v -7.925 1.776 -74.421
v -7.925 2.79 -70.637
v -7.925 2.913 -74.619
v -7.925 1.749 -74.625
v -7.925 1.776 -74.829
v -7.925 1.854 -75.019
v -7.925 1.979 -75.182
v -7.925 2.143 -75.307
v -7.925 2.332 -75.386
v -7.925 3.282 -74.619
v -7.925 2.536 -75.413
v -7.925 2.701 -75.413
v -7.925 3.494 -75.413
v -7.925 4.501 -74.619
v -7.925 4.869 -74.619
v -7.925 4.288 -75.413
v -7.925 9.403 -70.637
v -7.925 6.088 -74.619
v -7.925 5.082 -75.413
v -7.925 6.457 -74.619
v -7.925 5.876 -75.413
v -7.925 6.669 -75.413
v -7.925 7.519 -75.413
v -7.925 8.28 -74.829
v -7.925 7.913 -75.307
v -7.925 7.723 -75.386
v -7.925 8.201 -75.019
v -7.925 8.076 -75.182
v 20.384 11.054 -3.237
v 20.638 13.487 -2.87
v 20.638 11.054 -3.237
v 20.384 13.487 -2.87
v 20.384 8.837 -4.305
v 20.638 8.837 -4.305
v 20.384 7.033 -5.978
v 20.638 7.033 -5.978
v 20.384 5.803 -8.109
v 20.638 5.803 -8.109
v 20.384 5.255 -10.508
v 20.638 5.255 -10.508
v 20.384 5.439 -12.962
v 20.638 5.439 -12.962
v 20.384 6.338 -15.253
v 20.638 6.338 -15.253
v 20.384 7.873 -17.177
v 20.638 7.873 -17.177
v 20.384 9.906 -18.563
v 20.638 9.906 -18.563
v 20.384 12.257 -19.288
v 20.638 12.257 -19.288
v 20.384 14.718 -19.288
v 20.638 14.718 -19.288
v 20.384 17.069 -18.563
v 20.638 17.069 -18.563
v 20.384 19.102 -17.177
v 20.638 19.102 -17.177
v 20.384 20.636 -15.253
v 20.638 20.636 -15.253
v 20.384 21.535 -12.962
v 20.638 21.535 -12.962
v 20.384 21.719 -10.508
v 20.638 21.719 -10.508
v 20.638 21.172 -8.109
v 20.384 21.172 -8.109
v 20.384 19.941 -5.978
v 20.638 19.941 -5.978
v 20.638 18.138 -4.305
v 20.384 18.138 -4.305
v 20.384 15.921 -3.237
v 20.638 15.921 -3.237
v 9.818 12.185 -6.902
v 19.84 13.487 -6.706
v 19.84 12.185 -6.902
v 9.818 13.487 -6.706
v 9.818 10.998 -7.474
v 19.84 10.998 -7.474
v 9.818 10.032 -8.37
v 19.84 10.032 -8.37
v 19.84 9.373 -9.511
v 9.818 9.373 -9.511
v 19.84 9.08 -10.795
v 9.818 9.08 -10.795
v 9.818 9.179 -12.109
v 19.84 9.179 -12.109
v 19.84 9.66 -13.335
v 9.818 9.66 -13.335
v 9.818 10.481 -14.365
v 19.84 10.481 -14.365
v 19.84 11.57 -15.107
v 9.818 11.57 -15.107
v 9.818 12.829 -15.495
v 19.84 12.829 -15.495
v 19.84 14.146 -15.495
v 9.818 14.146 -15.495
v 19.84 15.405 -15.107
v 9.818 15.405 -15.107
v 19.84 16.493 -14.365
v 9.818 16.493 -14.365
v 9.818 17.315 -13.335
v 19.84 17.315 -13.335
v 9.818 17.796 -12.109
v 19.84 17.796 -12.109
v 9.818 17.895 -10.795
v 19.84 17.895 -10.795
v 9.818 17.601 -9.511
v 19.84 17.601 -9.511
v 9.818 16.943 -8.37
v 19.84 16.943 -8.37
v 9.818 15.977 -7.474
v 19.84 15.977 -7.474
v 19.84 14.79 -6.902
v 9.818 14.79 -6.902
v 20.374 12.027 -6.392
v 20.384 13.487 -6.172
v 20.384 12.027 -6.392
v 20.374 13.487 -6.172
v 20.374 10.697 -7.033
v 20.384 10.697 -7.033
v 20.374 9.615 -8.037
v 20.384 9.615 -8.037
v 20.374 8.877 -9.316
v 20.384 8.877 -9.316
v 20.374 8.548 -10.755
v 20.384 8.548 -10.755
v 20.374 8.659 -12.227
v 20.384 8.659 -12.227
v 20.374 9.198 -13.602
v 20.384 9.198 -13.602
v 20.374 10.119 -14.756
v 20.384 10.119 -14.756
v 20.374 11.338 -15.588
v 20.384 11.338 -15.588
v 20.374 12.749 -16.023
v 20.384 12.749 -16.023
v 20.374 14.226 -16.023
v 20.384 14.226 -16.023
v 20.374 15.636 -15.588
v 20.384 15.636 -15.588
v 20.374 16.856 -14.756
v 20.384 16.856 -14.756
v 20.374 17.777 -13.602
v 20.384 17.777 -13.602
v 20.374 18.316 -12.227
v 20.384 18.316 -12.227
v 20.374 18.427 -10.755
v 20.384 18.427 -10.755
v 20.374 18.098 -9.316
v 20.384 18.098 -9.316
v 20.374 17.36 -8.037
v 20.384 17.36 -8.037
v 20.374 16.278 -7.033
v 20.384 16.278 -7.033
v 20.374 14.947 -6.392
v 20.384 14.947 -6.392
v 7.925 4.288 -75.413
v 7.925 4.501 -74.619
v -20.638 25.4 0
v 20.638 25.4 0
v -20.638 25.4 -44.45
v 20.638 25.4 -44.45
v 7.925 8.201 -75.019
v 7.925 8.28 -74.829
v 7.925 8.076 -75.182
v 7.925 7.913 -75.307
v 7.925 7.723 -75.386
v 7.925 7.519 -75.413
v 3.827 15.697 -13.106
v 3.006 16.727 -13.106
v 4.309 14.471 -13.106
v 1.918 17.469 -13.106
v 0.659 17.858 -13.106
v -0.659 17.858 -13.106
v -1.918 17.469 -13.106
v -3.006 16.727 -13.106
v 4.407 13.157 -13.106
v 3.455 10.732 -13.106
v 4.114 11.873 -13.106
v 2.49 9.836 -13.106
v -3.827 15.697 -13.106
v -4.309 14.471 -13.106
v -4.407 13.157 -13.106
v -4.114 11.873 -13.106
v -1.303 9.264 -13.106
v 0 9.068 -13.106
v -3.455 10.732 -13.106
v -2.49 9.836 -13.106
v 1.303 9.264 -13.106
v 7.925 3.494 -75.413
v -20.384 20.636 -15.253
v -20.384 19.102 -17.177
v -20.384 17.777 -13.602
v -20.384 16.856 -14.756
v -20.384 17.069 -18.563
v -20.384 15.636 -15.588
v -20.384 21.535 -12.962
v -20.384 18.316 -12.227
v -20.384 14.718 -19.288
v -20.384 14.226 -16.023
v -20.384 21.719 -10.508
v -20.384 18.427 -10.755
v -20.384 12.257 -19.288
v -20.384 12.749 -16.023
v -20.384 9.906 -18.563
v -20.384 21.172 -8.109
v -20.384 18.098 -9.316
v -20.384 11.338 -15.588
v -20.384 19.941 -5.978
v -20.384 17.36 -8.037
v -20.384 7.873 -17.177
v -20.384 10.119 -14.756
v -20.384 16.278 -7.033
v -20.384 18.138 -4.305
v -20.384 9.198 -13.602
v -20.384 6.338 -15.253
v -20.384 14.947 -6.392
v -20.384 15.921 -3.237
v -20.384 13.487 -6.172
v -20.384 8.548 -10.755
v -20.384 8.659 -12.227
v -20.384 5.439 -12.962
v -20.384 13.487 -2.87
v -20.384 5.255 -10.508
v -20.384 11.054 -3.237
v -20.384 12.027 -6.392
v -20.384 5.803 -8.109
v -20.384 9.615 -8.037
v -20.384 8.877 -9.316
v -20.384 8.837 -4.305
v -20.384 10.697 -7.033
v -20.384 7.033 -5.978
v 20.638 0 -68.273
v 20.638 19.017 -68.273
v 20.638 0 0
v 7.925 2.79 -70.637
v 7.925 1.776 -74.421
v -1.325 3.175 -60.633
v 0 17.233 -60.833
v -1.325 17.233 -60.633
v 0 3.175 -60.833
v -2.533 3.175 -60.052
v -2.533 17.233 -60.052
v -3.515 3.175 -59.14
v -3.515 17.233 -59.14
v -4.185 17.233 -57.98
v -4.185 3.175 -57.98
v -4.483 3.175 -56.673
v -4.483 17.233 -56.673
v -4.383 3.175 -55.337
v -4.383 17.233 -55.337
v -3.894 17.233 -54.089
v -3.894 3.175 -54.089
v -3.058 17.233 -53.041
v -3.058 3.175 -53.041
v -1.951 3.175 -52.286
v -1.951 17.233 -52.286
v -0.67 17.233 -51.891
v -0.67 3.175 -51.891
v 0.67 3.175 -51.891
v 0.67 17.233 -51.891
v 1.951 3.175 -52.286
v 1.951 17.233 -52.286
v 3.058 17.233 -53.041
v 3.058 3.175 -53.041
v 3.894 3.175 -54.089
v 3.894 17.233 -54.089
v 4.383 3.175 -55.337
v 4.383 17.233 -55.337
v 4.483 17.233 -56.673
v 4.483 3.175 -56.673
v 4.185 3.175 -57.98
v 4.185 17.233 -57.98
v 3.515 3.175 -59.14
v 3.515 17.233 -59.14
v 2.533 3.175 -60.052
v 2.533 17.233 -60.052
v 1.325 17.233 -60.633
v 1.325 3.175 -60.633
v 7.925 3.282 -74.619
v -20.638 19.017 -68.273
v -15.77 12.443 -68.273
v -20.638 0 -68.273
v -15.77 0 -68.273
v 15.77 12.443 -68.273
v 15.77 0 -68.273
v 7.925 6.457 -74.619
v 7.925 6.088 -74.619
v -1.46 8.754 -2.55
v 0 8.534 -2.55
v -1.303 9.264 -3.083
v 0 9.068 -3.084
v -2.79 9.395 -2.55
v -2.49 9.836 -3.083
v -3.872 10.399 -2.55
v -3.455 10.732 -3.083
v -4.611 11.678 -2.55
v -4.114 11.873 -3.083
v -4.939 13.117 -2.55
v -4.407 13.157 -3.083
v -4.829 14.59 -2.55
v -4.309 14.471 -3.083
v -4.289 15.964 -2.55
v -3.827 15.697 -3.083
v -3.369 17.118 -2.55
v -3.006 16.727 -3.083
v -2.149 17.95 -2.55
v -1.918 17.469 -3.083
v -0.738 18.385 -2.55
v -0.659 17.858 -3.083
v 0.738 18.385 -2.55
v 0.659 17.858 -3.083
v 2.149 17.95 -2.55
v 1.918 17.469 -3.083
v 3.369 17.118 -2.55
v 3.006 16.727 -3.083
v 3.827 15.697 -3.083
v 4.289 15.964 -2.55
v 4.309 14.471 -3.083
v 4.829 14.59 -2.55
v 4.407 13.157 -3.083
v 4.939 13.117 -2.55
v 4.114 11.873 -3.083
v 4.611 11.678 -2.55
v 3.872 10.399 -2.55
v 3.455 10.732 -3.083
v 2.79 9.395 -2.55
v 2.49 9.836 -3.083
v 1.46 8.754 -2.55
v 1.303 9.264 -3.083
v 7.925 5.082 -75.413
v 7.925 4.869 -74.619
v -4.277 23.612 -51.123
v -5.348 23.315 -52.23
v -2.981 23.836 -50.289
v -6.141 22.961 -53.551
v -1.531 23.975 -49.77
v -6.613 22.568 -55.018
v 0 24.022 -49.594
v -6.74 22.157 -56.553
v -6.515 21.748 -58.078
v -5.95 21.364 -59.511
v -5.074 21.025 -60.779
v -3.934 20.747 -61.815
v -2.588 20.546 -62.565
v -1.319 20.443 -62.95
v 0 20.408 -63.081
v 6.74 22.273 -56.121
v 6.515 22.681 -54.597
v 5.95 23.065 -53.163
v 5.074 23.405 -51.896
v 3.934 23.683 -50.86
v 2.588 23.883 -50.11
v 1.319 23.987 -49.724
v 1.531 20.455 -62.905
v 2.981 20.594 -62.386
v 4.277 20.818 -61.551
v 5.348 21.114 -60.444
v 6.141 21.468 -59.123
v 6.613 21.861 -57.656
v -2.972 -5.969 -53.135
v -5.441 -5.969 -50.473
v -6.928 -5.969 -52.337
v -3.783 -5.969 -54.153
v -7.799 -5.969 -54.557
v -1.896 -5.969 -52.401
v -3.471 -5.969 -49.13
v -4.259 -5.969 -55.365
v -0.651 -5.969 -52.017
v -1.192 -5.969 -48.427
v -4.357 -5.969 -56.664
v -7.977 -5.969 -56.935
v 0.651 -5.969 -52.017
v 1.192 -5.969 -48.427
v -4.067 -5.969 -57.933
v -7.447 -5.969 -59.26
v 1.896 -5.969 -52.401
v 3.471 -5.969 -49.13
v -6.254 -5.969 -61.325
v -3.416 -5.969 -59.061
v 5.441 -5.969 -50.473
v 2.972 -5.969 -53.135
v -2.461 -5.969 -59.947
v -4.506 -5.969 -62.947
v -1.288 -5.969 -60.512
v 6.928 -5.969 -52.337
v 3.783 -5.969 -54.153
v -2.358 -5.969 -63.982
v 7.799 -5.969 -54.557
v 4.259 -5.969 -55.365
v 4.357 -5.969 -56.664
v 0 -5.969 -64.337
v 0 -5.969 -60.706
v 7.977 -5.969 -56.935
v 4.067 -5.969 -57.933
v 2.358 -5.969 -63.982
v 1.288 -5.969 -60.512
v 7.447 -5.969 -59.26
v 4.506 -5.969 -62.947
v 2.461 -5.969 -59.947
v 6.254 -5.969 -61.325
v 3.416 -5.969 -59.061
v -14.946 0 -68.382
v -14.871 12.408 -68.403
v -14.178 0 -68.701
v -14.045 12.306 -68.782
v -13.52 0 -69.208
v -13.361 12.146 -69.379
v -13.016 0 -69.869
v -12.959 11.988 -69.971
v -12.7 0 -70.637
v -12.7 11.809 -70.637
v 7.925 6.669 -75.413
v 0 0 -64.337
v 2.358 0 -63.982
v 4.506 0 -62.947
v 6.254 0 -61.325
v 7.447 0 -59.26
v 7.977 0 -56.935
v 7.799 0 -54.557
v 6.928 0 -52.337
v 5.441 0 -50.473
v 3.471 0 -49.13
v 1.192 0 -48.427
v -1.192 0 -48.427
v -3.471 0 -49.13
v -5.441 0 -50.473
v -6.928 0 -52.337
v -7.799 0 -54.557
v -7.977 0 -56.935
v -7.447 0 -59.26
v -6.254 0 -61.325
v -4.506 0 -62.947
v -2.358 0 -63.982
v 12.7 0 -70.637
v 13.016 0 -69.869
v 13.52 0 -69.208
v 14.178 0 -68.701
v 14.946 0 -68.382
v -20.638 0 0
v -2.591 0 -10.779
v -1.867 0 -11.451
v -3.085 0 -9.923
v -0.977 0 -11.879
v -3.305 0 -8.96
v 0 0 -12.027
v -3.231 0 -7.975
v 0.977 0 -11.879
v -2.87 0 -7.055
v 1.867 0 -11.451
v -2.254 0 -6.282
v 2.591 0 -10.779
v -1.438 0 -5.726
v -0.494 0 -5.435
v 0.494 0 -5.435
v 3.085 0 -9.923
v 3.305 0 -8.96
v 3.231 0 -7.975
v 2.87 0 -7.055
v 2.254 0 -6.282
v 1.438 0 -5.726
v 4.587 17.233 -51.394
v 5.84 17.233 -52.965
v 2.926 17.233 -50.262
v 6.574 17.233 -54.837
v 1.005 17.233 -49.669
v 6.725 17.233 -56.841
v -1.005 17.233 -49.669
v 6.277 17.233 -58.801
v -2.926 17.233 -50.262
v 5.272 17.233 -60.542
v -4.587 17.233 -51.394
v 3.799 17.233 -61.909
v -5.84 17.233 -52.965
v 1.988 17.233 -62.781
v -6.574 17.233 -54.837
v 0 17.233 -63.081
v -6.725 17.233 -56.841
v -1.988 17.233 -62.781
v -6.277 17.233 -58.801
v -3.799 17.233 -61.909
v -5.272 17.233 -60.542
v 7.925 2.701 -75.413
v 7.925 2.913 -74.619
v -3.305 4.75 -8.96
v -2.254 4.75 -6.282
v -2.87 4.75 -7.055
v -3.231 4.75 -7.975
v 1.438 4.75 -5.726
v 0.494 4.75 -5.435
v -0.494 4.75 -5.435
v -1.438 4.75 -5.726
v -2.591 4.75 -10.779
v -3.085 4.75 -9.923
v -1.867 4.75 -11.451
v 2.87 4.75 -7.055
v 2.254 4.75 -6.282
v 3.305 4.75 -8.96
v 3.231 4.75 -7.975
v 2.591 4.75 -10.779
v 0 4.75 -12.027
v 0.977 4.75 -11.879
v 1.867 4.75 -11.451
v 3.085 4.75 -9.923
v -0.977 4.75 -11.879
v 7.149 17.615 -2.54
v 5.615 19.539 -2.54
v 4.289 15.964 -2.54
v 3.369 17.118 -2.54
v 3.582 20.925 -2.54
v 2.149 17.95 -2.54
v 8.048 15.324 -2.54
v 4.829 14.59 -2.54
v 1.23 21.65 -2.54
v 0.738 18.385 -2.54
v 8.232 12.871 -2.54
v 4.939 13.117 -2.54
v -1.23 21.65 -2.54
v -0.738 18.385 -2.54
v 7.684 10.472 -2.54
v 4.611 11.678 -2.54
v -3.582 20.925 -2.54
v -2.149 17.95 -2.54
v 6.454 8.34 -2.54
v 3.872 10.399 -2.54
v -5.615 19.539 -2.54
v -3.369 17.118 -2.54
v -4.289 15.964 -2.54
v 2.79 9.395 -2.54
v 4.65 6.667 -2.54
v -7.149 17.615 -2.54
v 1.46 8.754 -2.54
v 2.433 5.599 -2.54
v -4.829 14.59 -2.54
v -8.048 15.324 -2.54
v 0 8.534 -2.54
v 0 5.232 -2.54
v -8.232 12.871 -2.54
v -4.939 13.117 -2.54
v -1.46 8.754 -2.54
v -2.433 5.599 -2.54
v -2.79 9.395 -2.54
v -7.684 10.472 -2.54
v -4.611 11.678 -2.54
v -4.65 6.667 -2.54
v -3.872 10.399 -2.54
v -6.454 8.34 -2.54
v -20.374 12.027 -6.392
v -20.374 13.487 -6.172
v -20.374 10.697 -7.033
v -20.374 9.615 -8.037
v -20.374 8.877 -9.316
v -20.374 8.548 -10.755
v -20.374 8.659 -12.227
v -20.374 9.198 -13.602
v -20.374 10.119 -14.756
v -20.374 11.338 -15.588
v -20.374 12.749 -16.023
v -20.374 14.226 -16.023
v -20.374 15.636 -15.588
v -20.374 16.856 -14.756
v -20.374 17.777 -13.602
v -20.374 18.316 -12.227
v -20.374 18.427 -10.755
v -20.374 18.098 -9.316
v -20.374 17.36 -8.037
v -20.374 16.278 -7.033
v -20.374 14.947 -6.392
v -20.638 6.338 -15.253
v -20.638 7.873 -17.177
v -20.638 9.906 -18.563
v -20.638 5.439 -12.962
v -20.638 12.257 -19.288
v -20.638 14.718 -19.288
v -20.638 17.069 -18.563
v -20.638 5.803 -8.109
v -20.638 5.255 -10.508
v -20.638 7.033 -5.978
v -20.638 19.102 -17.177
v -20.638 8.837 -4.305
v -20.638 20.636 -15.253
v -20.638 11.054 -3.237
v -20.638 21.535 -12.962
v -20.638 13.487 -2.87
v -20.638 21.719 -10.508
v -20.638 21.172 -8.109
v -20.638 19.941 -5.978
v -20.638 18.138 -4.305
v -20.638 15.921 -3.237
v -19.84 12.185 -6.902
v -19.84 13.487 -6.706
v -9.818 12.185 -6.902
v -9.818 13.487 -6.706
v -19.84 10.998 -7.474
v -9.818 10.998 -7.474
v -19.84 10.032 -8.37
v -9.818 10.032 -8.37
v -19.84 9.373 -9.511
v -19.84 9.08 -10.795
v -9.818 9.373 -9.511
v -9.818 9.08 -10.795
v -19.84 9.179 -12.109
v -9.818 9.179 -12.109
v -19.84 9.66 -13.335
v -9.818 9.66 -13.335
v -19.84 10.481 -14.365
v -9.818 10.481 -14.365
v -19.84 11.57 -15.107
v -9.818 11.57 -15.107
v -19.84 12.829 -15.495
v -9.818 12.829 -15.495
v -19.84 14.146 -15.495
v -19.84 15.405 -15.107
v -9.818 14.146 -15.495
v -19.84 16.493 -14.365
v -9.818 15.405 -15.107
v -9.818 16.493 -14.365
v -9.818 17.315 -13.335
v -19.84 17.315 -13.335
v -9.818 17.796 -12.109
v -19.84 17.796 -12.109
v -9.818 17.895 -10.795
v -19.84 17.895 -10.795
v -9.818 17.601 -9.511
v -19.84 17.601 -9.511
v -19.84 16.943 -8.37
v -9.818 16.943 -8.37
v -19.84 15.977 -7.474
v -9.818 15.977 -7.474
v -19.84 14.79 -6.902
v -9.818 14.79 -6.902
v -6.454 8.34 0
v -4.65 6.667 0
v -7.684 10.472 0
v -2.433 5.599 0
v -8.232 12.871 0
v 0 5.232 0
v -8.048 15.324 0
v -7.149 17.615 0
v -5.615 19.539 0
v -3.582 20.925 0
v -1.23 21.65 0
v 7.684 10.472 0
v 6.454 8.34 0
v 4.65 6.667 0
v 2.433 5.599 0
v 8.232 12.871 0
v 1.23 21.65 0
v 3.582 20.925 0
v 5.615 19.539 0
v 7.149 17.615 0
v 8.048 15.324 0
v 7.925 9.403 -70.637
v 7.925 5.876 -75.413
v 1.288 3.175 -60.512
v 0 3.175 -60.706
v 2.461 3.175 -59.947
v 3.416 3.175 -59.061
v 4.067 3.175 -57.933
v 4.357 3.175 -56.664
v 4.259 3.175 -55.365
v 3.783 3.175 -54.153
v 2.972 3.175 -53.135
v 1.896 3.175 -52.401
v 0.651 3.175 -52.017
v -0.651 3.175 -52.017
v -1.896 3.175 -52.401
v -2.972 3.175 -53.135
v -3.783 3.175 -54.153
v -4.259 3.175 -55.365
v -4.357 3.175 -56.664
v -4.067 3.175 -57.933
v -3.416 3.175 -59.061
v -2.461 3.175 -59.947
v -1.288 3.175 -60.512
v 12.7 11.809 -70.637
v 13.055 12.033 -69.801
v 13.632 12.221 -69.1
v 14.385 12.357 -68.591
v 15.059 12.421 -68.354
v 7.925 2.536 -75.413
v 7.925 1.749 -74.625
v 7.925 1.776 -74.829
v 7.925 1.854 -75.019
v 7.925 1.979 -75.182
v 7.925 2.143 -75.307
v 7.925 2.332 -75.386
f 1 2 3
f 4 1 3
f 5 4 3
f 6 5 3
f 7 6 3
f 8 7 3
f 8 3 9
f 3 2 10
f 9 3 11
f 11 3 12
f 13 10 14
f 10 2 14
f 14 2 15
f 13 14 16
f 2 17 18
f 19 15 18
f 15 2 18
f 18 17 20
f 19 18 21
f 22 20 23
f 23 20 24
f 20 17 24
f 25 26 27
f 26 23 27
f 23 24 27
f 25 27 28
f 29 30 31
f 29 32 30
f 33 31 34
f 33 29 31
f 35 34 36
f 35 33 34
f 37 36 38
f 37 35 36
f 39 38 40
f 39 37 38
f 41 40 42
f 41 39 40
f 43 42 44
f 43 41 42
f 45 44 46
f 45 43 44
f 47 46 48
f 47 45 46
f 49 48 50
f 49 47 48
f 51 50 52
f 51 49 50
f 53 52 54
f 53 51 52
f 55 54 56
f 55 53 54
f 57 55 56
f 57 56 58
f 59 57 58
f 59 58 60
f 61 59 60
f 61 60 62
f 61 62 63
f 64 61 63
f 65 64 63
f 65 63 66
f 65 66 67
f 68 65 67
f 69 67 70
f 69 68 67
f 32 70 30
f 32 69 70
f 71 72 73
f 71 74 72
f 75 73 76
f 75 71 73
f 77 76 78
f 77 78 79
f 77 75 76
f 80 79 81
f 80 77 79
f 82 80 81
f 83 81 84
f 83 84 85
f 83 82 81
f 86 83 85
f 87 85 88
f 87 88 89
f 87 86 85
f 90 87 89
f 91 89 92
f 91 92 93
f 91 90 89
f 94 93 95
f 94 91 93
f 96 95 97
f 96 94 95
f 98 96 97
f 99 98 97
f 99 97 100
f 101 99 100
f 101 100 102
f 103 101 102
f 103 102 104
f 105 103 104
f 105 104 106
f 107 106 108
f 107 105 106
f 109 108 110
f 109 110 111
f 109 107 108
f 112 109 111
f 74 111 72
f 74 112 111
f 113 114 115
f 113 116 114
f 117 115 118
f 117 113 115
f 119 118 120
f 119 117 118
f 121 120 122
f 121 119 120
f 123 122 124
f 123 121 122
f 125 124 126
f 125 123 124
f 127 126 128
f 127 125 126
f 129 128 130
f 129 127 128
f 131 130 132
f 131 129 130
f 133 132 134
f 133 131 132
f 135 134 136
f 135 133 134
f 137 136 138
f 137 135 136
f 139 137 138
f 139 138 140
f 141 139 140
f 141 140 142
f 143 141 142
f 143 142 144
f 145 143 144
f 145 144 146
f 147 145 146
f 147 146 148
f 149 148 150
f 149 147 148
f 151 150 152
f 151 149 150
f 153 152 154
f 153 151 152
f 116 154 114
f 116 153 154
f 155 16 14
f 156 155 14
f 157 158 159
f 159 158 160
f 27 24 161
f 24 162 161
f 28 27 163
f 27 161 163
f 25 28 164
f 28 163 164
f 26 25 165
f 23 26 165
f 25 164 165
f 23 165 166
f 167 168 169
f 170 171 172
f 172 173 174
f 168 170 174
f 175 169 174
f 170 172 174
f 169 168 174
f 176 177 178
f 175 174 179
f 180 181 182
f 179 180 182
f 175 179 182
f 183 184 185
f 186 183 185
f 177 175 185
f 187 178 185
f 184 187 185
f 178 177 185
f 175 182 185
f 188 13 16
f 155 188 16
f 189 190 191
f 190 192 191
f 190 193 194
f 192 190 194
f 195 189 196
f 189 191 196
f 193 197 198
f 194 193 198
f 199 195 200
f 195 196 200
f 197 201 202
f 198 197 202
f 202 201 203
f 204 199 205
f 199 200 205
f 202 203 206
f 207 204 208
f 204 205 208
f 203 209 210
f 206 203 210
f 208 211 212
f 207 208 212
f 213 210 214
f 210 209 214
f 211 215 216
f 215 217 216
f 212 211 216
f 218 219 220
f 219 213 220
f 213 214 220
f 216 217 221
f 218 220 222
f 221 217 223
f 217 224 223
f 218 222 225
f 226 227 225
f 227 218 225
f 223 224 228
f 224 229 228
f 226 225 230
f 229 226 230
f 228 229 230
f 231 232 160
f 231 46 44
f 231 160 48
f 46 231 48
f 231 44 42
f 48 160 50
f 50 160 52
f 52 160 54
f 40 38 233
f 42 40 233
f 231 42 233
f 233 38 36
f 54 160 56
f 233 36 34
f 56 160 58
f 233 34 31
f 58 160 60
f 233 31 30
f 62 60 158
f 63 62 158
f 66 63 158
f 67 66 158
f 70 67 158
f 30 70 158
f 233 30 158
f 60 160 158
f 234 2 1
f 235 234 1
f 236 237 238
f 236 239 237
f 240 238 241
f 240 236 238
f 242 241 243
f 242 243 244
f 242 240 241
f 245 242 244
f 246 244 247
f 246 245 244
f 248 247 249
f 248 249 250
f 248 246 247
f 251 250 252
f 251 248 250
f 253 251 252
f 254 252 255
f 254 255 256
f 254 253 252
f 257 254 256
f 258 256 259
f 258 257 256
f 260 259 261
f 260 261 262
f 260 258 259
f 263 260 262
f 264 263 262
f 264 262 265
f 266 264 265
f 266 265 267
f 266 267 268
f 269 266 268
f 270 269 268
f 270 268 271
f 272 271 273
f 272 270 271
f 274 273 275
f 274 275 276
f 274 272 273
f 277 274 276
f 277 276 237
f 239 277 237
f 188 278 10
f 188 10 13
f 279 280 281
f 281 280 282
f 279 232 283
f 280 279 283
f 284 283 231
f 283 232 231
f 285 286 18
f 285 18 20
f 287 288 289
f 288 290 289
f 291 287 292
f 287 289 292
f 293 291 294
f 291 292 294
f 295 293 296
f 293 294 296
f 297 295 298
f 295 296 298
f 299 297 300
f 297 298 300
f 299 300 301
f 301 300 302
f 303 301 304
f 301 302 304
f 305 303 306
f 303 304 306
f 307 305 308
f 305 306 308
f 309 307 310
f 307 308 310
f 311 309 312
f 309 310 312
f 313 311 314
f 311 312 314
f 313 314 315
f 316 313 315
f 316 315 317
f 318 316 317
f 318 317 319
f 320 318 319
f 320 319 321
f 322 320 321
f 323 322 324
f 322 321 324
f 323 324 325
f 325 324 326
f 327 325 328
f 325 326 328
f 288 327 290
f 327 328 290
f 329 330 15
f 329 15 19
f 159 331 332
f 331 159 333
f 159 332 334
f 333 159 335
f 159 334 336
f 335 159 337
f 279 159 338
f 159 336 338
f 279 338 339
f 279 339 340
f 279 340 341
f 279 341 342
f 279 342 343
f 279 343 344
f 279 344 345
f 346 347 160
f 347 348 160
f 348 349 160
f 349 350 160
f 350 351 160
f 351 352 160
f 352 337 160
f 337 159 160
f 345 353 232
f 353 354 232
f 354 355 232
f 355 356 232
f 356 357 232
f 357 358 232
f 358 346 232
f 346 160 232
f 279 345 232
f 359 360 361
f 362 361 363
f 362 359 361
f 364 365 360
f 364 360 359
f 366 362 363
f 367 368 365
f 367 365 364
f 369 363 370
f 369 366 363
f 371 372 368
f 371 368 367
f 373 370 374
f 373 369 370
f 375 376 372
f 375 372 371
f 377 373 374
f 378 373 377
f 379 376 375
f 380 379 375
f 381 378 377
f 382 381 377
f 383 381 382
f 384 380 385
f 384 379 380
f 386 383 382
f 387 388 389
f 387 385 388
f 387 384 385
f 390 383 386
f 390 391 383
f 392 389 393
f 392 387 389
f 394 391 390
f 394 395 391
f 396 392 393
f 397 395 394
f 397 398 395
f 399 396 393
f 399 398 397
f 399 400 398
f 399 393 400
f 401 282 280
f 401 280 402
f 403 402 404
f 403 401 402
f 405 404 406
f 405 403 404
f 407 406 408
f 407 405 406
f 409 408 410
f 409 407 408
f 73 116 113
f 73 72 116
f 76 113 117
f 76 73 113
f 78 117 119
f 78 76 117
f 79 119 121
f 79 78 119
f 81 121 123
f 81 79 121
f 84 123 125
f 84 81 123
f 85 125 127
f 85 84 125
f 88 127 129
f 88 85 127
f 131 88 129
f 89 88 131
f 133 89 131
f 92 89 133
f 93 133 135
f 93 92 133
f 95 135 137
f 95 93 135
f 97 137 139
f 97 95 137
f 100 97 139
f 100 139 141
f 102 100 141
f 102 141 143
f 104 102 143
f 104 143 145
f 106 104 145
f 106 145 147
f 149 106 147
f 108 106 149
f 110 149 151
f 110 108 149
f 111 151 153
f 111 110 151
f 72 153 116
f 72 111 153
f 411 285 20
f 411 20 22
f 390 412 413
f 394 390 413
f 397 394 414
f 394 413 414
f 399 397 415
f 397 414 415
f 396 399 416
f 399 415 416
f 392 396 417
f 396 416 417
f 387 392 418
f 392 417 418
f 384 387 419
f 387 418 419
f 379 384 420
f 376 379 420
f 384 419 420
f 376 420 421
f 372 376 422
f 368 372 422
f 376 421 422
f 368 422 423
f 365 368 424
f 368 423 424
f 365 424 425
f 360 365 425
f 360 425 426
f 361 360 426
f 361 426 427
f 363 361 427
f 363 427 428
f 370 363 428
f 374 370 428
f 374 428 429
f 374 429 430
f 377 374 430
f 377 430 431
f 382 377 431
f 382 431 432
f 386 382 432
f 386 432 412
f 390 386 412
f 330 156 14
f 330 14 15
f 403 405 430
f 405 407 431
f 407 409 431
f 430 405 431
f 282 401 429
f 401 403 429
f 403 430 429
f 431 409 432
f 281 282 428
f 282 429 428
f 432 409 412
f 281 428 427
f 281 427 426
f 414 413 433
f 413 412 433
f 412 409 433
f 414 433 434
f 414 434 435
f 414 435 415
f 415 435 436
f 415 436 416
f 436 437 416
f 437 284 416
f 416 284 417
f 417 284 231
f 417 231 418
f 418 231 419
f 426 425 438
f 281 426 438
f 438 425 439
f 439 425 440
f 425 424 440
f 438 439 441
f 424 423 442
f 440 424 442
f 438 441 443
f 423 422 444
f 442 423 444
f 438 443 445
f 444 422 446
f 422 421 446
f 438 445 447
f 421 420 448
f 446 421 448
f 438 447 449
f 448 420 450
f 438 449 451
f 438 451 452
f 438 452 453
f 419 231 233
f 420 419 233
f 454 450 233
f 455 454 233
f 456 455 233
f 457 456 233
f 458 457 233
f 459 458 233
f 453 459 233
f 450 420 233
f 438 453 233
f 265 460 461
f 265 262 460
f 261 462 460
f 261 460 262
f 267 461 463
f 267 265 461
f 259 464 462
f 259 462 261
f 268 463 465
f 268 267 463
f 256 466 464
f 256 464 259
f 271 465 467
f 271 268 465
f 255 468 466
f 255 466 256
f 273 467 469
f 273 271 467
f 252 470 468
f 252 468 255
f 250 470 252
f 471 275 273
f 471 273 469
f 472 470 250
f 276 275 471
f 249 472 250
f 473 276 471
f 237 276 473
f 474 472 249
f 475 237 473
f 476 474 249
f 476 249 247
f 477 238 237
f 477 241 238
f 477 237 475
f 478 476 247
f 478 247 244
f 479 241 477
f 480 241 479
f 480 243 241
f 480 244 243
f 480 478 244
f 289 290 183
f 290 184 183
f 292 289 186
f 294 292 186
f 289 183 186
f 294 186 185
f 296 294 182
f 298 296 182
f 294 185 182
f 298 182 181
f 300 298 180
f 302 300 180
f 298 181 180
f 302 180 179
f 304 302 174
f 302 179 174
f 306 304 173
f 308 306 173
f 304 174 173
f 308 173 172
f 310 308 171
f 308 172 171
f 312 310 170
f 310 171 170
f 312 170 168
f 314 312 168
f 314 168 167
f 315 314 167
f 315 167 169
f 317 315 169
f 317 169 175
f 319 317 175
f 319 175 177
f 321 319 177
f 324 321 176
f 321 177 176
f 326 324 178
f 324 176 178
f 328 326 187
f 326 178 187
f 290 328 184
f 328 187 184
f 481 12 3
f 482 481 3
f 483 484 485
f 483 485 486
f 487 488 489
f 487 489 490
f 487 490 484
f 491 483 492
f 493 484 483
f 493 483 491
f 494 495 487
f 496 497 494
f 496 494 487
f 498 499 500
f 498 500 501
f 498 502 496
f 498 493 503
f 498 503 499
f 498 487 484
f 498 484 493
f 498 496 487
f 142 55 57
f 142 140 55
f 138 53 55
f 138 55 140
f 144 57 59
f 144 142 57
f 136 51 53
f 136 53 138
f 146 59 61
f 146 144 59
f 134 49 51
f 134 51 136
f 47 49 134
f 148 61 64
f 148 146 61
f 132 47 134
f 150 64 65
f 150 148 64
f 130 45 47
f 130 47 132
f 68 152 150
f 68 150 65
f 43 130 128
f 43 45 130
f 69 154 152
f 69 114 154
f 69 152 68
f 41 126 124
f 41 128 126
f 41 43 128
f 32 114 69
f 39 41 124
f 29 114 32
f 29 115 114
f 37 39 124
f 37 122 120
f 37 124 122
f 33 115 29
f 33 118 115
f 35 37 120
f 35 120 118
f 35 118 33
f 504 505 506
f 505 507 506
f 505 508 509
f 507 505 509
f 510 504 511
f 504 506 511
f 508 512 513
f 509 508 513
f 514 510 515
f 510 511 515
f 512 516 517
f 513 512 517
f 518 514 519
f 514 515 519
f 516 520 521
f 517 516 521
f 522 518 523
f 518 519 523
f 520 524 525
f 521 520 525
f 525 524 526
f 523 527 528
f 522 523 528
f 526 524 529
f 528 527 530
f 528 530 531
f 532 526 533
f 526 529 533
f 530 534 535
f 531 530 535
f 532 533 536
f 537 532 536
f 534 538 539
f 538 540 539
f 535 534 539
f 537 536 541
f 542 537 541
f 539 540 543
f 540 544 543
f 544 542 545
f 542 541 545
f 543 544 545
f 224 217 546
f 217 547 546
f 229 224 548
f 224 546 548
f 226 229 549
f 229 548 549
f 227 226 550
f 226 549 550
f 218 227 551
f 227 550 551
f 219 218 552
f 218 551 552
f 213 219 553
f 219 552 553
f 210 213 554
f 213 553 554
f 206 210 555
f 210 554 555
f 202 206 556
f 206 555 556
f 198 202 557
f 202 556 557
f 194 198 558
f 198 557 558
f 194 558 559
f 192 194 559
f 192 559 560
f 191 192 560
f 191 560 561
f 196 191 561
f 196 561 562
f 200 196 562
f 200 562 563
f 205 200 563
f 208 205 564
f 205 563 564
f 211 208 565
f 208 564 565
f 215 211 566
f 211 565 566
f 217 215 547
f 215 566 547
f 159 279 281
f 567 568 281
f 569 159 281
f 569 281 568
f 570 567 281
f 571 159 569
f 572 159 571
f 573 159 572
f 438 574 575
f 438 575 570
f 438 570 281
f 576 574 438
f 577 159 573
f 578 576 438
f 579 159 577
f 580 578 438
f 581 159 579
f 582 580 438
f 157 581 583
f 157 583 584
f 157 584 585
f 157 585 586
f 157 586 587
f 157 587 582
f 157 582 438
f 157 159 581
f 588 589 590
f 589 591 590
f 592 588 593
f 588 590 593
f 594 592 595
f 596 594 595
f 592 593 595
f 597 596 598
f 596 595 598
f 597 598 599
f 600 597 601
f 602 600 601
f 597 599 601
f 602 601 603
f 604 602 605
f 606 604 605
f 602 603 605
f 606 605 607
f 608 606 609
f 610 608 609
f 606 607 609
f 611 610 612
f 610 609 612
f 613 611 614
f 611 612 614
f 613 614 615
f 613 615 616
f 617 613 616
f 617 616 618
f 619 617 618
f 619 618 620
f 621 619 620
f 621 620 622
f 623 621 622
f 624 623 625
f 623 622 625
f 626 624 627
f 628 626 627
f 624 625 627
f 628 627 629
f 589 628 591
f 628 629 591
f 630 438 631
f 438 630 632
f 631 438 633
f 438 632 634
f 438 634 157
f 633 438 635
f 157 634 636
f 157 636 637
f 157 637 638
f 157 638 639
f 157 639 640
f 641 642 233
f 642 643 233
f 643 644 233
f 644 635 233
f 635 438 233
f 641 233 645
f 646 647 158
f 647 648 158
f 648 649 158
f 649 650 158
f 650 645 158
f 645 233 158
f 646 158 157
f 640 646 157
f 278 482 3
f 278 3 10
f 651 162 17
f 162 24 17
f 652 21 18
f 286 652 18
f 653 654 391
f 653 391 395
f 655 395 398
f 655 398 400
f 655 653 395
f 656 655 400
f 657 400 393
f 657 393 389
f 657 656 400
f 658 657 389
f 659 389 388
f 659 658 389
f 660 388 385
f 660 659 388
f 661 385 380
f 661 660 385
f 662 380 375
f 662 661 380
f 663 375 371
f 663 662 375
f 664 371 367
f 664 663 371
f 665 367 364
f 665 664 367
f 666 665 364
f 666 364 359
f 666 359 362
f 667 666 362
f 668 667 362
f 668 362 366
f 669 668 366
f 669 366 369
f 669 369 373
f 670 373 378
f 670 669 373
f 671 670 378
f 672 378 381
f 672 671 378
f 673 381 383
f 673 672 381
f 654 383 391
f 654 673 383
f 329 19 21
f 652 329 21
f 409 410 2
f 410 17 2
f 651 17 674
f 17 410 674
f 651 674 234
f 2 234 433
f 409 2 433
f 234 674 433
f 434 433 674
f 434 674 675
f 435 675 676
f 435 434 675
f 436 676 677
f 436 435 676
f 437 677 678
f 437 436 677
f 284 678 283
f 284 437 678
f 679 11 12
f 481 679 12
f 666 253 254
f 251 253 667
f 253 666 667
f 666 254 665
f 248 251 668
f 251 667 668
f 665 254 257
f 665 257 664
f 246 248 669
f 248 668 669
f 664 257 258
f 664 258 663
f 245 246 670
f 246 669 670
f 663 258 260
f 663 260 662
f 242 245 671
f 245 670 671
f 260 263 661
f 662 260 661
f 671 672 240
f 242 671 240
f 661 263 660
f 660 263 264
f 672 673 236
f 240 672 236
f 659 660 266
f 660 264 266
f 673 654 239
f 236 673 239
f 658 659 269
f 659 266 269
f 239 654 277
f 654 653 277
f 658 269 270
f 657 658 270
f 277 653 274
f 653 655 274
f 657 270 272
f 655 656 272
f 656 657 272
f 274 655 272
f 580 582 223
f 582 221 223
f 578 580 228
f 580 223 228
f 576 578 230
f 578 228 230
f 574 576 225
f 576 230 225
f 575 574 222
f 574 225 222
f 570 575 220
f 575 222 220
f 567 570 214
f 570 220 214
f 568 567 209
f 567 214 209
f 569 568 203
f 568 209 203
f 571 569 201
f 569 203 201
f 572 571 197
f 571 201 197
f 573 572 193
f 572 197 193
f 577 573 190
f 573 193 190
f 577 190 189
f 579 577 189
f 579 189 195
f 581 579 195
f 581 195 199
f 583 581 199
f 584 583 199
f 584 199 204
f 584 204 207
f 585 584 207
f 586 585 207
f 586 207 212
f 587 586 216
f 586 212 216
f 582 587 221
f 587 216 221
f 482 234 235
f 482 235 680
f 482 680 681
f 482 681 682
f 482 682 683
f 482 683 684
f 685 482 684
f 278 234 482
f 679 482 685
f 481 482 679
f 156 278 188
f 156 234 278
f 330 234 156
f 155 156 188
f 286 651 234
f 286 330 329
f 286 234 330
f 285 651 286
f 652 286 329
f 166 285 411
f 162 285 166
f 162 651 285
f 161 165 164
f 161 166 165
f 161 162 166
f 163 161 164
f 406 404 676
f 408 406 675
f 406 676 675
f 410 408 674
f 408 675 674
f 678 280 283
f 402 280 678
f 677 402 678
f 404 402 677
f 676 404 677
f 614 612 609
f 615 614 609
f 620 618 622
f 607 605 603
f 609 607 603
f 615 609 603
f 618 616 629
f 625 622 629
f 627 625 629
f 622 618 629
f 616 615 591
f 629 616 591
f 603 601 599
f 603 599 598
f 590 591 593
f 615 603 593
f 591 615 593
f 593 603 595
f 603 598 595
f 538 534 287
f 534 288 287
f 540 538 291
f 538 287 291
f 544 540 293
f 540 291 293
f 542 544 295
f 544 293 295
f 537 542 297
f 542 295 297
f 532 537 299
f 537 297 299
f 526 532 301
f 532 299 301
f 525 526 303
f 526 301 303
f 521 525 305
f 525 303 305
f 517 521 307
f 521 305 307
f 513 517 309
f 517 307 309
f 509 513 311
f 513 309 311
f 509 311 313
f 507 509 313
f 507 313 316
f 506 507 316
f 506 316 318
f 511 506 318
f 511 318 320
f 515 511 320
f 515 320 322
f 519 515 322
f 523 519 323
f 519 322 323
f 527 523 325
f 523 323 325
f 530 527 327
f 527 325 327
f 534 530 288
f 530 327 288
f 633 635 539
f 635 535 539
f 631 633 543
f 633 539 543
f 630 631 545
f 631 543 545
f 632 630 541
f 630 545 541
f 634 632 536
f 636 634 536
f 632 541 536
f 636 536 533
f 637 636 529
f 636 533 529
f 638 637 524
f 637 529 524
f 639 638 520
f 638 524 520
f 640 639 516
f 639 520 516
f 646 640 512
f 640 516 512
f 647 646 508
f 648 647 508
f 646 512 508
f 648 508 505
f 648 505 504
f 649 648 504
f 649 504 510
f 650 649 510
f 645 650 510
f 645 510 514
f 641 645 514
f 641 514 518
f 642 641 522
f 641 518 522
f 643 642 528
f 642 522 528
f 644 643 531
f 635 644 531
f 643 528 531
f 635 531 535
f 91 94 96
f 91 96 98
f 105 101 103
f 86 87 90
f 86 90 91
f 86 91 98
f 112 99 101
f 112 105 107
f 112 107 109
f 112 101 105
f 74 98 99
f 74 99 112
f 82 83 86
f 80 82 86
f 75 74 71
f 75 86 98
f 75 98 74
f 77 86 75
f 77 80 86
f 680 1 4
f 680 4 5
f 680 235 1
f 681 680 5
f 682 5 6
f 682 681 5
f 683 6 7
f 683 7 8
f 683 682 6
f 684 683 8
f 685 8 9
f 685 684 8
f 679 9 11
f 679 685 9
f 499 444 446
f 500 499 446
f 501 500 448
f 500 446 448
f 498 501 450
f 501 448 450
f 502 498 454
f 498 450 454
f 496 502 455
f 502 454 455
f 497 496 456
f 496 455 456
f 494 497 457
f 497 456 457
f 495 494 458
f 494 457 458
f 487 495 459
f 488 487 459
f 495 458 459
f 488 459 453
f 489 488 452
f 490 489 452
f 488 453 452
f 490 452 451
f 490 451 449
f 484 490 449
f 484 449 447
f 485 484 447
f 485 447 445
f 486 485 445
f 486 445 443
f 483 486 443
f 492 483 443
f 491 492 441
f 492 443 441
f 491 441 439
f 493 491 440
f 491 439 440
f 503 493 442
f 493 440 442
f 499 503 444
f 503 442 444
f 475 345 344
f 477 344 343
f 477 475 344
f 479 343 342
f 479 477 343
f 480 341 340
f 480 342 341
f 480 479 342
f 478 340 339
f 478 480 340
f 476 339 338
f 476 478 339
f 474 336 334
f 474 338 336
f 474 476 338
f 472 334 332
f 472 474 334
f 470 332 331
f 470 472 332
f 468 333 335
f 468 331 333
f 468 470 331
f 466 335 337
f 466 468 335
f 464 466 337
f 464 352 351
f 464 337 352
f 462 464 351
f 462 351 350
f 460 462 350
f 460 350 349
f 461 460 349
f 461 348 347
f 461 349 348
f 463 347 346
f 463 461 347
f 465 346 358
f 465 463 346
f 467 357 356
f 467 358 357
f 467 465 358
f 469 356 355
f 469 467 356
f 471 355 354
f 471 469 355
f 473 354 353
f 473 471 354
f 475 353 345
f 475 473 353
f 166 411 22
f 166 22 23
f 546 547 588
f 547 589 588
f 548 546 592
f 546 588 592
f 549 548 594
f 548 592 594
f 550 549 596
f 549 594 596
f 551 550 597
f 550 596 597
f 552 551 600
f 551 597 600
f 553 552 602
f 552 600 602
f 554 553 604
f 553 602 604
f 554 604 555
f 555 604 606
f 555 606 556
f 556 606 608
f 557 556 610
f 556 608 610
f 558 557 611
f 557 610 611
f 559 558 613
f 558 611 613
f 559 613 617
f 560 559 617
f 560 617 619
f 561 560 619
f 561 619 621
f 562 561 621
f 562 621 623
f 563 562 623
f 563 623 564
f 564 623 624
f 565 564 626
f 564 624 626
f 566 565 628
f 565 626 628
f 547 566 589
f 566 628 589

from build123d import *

# Parameters (mm, degrees)
EXTRUDE1_DEPTH      = 20.6375
EXTRUDE1_DEPTH_BACK = 20.6375
CUT_EXTRUDE1_REACH  = 27.4
SKETCH4_R           = 7.99973
SKETCH4_R_2         = 4.3688
EXTRUDE2_DEPTH      = 9.144
EXTRUDE3_DEPTH      = 7.925
EXTRUDE3_DEPTH_BACK = 7.925
CUT_EXTRUDE2_DEPTH  = 24.765
LPATTERN2_COUNT     = 3
LPATTERN2_PITCH     = 1.5875
FILLET1_R           = 0.7874
SKETCH11_R          = 3.3145
CUT_EXTRUDE3_DEPTH  = 4.7498


with BuildPart() as part:
    # Sketch1 → Extrude1 (new body, two sides)
    with BuildSketch(Plane(origin=(0, 0, 0), x_dir=(0, 0, -1), z_dir=(1, 0, 0))) as extrude1_sk:
        Polygon((44.45, 25.4), (68.273015024, 19.016642363), (68.273015024, 12.442638617), (70.6374, 11.809103573), (70.6374, 0), (0, 0), (0, 25.4), align=None)
    extrude(amount=EXTRUDE1_DEPTH)
    extrude(extrude1_sk.sketch, amount=-EXTRUDE1_DEPTH_BACK)

    # Cut-Extrude1: up to this plane
    cut_extrude1_end = Plane(origin=(-20.6375, 12.442638617, -68.273015024), z_dir=(0, 0.965925826, -0.258819045))
    # Sketch2 → Cut-Extrude1 (cut, up to the surface)
    with BuildSketch(Plane.XZ, mode=Mode.PRIVATE) as cut_extrude1_sk1:
        with BuildLine():
            Line((20.6375, -70.6374), (12.7, -70.6374))
            ThreePointArc((12.7, -70.6374), (13.832391453, -68.932629596), (15.769776585, -68.273015024))
            Line((15.769776585, -68.273015024), (20.6375, -68.273015024))
            Line((20.6375, -68.273015024), (20.6375, -70.6374))
        make_face()
    cut_extrude1_tool1 = split(extrude(cut_extrude1_sk1.sketch, amount=-CUT_EXTRUDE1_REACH, mode=Mode.PRIVATE), bisect_by=cut_extrude1_end, keep=Keep.BOTH, mode=Mode.PRIVATE)
    add(cut_extrude1_tool1.solids().sort_by_distance((17.033922, 0, -69.518139))[0], mode=Mode.SUBTRACT)
    # Sketch2 → Cut-Extrude1 (cut, up to the surface)
    with BuildSketch(Plane.XZ, mode=Mode.PRIVATE) as cut_extrude1_sk2:
        with BuildLine():
            Line((-20.6375, -68.273015024), (-15.769776585, -68.273015024))
            ThreePointArc((-15.769776585, -68.273015024), (-13.832391453, -68.932629596), (-12.7, -70.6374))
            Line((-12.7, -70.6374), (-20.6375, -70.6374))
            Line((-20.6375, -70.6374), (-20.6375, -68.273015024))
        make_face()
    cut_extrude1_tool2 = split(extrude(cut_extrude1_sk2.sketch, amount=-CUT_EXTRUDE1_REACH, mode=Mode.PRIVATE), bisect_by=cut_extrude1_end, keep=Keep.BOTH, mode=Mode.PRIVATE)
    add(cut_extrude1_tool2.solids().sort_by_distance((-17.033922, 0, -69.518139))[0], mode=Mode.SUBTRACT)

    # Sketch3 → Cut-Revolve1 (revolve, cut)
    with BuildSketch(Plane(origin=(0, 0, 0), x_dir=(0, 0, -1), z_dir=(1, 0, 0)), mode=Mode.PRIVATE) as cut_revolve1_sk:
        Polygon((49.5937, 24.021749739), (49.5937, 17.232918978), (51.8412, 17.232918978), (51.8412, 3.175), (48.3616, 3.175), (48.3616, 0), (56.3372, 0), (56.3372, 24.021749739), align=None)
    revolve(cut_revolve1_sk.sketch.rotate(Axis((0, -4.910727806, -56.3372), (0, 1, 0)), 180), axis=Axis((0, -4.910727806, -56.3372), (0, 1, 0)), mode=Mode.SUBTRACT)  # turned: the seam where the file's is

    # Sketch4 → Extrude2 (add)
    with BuildSketch(Plane.XZ.offset(-3.175)):
        with Locations(Location((0, -56.3372, 0), (0, 0, 270))):  # turned: the seam where the file's is
            Circle(SKETCH4_R)
        with Locations(Location((0, -56.3372, 0), (0, 0, 270))):  # turned: the seam where the file's is
            Circle(SKETCH4_R_2, mode=Mode.SUBTRACT)
    extrude(amount=EXTRUDE2_DEPTH)

    # Sketch6 → Extrude3 (add, two sides)
    with BuildSketch(Plane(origin=(0, 0, 0), x_dir=(0, 0, -1), z_dir=(1, 0, 0))) as extrude3_sk:
        Polygon((70.6374, 2.789570434), (75.4126, 1.51005945), (75.4126, 8.12340369), (70.6374, 9.402914674), align=None)
    extrude(amount=EXTRUDE3_DEPTH)
    extrude(extrude3_sk.sketch, amount=-EXTRUDE3_DEPTH_BACK)

    # Sketch7 → Cut-Extrude2 (cut, symmetric)
    with BuildSketch(Plane(origin=(0, 0, 0), x_dir=(0, 0, -1), z_dir=(1, 0, 0))):
        Polygon((75.4126, 3.49443445), (75.4126, 2.70068445), (74.61885, 2.913369121), (74.61885, 3.281749778), align=None)
    cut_extrude2 = extrude(amount=CUT_EXTRUDE2_DEPTH, both=True, mode=Mode.SUBTRACT)

    # LPattern2: Cut-Extrude2 ×3
    with Locations(*[(0, i * LPATTERN2_PITCH, 0) for i in range(1, LPATTERN2_COUNT)]):
        add(cut_extrude2, mode=Mode.SUBTRACT)

    # Fillet1
    fillet1_edges = [part.edges().sort_by_distance(p)[0] for p in [
        (0, 8.12340369, -75.4126),
        (0, 1.51005945, -75.4126),
    ]]
    fillet(fillet1_edges, radius=FILLET1_R)

    # Sketch11 → Cut-Extrude3 (cut)
    with BuildSketch(Plane.XZ):
        with Locations(Location((0, -8.7122, 0), (0, 0, 270))):  # turned: the seam where the file's is
            Circle(SKETCH11_R)
    extrude(amount=-CUT_EXTRUDE3_DEPTH, mode=Mode.SUBTRACT)

    # Sketch12 → Cut-Revolve2 (revolve, cut)
    with BuildSketch(Plane(origin=(0, 0, 0), x_dir=(0, 0, -1), z_dir=(1, 0, 0)), mode=Mode.PRIVATE) as cut_revolve2_sk:
        Polygon((0, 21.7424), (2.54, 21.7424), (2.54, 18.4404), (2.55, 18.4404), (3.0835, 17.9069), (13.106, 17.9069), (13.106, 13.4874), (0, 13.4874), align=None)
    revolve(cut_revolve2_sk.sketch.rotate(Axis((0, 13.4874, 3.668396013), (0, 0, -1)), 180), axis=Axis((0, 13.4874, 3.668396013), (0, 0, -1)), mode=Mode.SUBTRACT)  # turned: the seam where the file's is

    # Sketch13 → Cut-Revolve3 (revolve, cut)
    with BuildSketch(Plane.XY.offset(-11.1252), mode=Mode.PRIVATE) as cut_revolve3_sk:
        Polygon((20.6375, 21.7424), (20.3835, 21.7424), (20.3835, 18.4404), (20.3735, 18.4404), (19.84, 17.9069), (9.8175, 17.9069), (9.8175, 13.4874), (20.6375, 13.4874), align=None)
        Polygon((-20.6375, 13.4874), (-20.6375, 21.7424), (-20.3835, 21.7424), (-20.3835, 18.4404), (-20.3735, 18.4404), (-19.84, 17.9069), (-9.8175, 17.9069), (-9.8175, 13.4874), align=None)
    revolve(cut_revolve3_sk.sketch.rotate(Axis((0, 13.4874, -11.1252), (1, 0, 0)), 90), axis=Axis((0, 13.4874, -11.1252), (1, 0, 0)), mode=Mode.SUBTRACT)  # turned: the seam where the file's is


solid = part.part
